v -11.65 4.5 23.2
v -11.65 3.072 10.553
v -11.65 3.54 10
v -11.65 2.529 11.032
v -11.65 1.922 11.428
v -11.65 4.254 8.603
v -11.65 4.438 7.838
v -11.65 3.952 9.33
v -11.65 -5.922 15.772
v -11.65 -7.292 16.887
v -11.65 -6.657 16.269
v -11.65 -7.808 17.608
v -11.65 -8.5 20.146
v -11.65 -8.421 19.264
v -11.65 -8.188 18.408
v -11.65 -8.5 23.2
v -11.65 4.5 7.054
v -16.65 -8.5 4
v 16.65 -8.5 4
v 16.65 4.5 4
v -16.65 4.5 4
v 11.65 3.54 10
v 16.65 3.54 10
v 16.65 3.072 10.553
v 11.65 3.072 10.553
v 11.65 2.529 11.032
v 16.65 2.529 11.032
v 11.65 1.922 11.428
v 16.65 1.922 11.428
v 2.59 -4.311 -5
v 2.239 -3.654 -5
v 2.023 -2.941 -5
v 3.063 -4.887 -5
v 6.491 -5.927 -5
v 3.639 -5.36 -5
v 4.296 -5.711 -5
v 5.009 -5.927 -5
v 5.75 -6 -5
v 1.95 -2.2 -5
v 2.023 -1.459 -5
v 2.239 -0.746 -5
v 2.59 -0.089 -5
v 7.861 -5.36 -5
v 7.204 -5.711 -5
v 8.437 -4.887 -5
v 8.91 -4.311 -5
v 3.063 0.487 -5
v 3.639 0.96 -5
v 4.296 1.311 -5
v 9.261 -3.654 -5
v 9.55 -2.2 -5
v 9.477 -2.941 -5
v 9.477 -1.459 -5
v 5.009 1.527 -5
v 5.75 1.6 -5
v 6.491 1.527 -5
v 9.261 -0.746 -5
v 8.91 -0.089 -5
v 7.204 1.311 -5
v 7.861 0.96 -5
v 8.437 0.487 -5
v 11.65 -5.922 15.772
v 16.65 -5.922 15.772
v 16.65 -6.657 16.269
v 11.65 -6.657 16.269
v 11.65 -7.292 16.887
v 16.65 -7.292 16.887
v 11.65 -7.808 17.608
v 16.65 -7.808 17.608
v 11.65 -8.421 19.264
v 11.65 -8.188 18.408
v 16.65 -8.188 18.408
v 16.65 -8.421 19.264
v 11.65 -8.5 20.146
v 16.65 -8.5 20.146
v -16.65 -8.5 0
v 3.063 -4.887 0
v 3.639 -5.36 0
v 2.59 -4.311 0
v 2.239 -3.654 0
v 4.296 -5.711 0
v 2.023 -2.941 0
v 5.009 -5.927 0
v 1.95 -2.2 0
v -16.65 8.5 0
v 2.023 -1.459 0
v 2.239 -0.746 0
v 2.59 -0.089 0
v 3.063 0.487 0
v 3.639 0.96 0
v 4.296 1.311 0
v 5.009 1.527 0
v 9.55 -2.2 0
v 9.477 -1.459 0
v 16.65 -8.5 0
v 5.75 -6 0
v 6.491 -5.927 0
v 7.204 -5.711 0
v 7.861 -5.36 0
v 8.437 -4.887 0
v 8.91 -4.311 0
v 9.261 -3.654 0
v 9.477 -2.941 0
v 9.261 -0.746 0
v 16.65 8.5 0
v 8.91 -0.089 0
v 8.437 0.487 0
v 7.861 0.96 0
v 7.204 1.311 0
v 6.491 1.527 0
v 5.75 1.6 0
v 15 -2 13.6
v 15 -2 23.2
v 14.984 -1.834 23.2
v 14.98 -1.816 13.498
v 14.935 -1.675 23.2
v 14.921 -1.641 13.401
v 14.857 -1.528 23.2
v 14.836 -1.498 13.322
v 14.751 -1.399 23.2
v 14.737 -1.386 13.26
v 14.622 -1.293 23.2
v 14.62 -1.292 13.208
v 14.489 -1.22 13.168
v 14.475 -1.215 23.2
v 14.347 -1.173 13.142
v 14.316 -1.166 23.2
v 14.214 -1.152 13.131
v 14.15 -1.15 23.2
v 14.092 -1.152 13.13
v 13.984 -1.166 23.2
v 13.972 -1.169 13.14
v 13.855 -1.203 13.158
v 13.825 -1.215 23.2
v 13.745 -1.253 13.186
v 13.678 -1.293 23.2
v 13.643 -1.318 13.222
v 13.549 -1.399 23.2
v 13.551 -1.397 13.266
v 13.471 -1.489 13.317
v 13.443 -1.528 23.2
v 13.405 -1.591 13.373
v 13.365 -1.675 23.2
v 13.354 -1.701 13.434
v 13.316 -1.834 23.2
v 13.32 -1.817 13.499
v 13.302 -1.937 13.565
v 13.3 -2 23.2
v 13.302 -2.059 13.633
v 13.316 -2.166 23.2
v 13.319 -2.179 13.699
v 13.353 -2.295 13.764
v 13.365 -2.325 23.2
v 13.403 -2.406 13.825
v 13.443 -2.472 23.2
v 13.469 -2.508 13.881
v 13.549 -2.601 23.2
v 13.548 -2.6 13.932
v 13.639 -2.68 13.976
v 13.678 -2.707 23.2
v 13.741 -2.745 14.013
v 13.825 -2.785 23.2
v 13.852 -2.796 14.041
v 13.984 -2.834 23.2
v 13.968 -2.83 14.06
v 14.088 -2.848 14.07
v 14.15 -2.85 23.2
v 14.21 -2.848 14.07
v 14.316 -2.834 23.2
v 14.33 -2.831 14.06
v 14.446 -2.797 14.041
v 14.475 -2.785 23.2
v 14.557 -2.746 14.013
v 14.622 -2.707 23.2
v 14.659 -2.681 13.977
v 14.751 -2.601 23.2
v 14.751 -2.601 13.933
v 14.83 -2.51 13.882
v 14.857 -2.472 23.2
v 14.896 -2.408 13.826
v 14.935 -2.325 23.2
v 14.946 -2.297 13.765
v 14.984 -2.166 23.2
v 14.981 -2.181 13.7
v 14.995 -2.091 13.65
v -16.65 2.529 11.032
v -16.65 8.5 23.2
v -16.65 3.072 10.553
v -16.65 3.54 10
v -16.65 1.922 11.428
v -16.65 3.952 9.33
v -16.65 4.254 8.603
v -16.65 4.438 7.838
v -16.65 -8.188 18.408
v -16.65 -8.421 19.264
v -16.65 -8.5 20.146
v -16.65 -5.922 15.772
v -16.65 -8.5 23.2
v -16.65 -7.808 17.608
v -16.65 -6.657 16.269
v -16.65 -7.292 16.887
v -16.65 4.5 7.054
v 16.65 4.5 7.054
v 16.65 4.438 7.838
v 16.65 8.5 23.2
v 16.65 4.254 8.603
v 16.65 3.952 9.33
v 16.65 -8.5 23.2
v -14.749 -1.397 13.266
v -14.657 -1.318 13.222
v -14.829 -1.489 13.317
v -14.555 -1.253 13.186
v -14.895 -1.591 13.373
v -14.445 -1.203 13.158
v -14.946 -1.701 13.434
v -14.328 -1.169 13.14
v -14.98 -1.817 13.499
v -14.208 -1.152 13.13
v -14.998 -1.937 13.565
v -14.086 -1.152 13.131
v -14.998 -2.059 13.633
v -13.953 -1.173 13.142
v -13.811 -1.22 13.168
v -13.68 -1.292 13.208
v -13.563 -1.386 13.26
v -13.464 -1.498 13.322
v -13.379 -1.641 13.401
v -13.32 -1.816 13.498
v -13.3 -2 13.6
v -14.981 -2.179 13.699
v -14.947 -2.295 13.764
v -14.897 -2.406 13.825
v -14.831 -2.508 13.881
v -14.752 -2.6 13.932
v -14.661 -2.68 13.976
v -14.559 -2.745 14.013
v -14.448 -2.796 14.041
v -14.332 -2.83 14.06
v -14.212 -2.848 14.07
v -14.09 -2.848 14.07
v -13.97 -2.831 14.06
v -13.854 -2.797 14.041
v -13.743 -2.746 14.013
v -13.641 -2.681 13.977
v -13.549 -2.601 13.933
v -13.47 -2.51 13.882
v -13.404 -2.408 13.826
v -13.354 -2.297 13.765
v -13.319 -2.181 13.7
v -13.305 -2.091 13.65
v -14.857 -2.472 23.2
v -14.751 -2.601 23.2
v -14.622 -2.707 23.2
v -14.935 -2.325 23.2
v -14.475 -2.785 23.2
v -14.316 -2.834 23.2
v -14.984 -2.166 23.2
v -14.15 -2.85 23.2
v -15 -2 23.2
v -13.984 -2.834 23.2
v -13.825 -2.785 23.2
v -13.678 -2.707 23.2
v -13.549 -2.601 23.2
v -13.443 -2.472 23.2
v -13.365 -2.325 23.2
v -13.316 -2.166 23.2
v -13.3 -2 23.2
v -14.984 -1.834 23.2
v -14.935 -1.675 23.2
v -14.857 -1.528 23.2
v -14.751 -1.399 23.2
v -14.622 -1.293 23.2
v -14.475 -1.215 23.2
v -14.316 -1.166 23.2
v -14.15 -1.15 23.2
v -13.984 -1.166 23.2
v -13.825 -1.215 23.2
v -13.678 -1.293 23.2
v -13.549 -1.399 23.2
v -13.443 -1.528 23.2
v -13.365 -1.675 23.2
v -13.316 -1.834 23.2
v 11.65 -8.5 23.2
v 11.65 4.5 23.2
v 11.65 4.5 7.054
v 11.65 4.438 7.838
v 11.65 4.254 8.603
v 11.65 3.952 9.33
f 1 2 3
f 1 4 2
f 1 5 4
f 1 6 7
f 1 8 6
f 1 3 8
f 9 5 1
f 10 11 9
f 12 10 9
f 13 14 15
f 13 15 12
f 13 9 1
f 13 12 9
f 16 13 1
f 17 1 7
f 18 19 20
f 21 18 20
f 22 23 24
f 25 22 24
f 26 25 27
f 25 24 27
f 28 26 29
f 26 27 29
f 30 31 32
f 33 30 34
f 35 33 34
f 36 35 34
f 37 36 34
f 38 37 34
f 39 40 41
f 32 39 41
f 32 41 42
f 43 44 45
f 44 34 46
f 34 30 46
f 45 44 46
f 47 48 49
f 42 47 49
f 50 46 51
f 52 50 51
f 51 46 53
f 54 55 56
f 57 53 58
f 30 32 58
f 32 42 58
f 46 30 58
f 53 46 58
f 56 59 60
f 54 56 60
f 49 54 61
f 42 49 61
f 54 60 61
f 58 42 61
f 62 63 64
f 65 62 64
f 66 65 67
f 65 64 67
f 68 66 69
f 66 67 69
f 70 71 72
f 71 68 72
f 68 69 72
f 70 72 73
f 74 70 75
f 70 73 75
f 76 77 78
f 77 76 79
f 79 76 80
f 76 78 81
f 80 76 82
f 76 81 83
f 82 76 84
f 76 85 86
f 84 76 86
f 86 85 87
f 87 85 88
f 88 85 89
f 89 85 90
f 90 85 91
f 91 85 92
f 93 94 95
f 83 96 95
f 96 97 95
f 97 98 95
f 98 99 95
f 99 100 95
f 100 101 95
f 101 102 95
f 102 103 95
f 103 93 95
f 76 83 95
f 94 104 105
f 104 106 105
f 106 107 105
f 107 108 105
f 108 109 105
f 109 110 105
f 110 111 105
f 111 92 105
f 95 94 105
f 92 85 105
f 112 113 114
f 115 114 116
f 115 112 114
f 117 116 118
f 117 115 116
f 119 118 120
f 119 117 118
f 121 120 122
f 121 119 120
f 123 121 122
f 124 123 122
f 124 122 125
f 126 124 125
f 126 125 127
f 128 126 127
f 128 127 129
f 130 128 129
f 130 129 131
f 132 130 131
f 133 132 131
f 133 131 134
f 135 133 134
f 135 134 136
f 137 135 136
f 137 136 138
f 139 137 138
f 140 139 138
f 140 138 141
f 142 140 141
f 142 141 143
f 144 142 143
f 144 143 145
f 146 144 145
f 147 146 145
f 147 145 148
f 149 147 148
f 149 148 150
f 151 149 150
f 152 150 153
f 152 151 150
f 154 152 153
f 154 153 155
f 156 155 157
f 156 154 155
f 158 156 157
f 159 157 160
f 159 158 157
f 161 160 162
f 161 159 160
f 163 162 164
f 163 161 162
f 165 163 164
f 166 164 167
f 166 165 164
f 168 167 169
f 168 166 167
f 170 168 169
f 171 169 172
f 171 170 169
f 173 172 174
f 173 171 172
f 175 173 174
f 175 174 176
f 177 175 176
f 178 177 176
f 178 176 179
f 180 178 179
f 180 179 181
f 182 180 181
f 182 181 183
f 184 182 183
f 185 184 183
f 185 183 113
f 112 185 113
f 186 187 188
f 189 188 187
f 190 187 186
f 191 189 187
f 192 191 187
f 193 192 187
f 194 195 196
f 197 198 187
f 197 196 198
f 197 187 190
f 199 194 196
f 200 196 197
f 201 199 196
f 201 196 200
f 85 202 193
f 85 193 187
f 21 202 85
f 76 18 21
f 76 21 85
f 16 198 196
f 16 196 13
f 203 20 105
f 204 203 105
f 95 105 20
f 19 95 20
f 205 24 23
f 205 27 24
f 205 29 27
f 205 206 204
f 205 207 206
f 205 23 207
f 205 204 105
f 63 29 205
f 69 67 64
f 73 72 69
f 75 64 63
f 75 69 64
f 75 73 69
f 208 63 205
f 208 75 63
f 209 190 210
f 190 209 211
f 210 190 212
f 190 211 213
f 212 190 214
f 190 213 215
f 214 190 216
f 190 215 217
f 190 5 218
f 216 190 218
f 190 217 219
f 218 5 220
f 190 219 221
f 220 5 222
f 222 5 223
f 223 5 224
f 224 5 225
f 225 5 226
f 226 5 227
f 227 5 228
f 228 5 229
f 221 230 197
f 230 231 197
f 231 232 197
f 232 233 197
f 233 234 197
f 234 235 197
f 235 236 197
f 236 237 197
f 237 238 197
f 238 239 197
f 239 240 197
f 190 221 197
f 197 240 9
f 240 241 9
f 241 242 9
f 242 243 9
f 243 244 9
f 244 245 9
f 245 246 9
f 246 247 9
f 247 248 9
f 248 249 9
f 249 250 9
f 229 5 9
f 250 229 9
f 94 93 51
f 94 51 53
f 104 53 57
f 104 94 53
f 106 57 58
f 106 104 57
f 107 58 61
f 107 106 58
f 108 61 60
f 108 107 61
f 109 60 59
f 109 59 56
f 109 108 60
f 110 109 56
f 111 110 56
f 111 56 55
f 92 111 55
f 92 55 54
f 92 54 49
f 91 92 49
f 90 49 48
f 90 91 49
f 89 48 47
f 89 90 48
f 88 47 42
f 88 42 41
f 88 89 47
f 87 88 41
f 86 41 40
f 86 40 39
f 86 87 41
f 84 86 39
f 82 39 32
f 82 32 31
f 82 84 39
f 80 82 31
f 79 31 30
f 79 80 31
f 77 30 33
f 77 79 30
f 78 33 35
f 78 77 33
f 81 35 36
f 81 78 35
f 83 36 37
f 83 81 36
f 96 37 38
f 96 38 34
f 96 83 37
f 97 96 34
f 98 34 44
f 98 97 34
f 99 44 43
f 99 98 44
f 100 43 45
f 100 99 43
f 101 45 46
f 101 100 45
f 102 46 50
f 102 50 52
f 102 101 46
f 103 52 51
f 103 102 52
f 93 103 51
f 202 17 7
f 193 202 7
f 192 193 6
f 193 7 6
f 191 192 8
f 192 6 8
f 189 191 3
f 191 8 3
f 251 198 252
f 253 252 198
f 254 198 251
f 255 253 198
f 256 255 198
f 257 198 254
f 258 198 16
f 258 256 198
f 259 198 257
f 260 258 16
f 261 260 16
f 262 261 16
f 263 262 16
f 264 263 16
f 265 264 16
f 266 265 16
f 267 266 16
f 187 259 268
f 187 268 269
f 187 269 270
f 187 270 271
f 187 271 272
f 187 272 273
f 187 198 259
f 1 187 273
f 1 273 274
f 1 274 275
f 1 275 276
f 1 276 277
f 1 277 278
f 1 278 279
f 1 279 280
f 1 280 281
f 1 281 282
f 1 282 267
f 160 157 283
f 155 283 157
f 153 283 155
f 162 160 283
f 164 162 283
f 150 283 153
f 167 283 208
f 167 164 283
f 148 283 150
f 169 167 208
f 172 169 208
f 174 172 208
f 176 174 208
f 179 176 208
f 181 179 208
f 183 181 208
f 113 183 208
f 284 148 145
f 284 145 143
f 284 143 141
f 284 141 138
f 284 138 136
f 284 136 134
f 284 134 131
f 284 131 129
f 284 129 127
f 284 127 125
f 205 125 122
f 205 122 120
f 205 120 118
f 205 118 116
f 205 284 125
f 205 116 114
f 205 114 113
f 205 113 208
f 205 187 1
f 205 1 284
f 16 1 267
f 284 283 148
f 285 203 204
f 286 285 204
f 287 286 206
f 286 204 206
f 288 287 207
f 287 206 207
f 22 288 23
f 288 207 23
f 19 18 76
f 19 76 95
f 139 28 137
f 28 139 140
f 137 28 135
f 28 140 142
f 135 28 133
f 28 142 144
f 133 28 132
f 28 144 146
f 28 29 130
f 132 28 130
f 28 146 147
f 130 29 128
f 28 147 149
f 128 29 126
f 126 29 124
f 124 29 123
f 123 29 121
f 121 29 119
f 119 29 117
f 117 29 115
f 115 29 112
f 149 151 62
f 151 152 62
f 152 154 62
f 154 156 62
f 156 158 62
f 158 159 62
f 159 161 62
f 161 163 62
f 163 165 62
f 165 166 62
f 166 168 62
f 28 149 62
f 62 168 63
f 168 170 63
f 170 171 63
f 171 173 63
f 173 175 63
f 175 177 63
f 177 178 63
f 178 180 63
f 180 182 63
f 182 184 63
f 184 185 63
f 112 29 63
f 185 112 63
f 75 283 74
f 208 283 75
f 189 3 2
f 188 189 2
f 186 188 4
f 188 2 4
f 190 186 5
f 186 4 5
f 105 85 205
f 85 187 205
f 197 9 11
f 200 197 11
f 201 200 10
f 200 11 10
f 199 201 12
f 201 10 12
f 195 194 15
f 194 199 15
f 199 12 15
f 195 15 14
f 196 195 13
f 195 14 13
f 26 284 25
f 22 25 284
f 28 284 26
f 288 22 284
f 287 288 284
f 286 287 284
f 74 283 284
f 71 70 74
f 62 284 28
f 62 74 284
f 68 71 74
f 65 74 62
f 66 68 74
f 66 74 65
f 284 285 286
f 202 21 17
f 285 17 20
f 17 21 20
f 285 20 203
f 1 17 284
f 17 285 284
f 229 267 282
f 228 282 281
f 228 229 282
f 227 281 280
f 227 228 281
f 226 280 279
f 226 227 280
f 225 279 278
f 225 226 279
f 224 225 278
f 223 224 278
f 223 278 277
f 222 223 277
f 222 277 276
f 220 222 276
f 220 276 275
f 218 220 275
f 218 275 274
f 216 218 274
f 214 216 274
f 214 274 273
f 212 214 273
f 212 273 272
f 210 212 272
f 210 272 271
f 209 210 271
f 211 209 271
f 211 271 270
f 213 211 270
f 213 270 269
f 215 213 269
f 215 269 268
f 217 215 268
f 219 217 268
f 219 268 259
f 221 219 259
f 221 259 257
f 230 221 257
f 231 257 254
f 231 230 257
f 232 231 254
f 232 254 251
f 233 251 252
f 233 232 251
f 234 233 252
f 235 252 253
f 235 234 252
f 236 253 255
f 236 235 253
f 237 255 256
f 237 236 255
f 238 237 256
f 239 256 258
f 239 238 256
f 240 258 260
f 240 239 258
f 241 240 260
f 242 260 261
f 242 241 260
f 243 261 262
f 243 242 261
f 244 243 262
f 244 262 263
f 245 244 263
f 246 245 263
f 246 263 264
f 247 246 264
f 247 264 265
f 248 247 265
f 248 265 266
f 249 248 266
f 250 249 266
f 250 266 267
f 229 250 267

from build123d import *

# Parameters (mm, degrees)
F1_W     = 5
F1_H     = 7.2
F1_H_2   = 6
F1_H_3   = 4
F1_W_2   = 23.3
F3_DEPTH = 8.5
F4_DEPTH = 23.2
F5_DEPTH = 18.1
F6_START = 4.3
F0_R     = 0.85
F6_DEPTH = 20.7
F0_R_2   = 3.8
F7_DEPTH = 5


with BuildPart() as f3:
    # F1 (on Front) → F3 (new body, symmetric)
    with BuildSketch(Plane.XZ):
        with Locations((-14.15, 13.6)):
            Rectangle(F1_W, F1_H)
        with Locations((-14.15, 20.2)):
            Rectangle(F1_W, F1_H_2)
        with Locations((-14.15, 7)):
            Rectangle(F1_W, F1_H_2)
        with Locations((-14.15, 2)):
            Rectangle(F1_W, F1_H_3)
        with Locations((0, 2)):
            Rectangle(F1_W_2, F1_H_3)
        with Locations((14.15, 2)):
            Rectangle(F1_W, F1_H_3)
        with Locations((14.15, 7)):
            Rectangle(F1_W, F1_H_2)
        with Locations((14.15, 13.6)):
            Rectangle(F1_W, F1_H)
        with Locations((14.15, 20.2)):
            Rectangle(F1_W, F1_H_2)
    extrude(amount=F3_DEPTH, both=True)

    # F0 (on Top) → F4 (join)
    with BuildSketch(Plane.XY):
        Polygon((11.65, 4.5), (11.65, 8.5), (0, 8.5), (-11.65, 8.5), (-11.65, 4.5), align=None)
    extrude(amount=F4_DEPTH)

    # F2 (on Right) → F5 (cut, symmetric)
    with BuildSketch(Plane.YZ):
        with BuildLine():
            Line((-8.5, 17.2), (-8.5, 10))
            Line((-8.5, 10), (3.5396314061, 10))
            ThreePointArc((3.5396314061, 10), (2.8089650426, 10.8020152096), (1.9224991399, 11.4275389379))
            Line((1.9224991399, 11.4275389379), (-5.9224991399, 15.7724610621))
            ThreePointArc((-5.9224991399, 15.7724610621), (-6.8089650426, 16.3979847904), (-7.5396314061, 17.2))
            Line((-7.5396314061, 17.2), (-8.5, 17.2))
        make_face()
        with BuildLine():
            Line((-8.5, 20.1464178425), (-8.5, 17.2))
            Line((-8.5, 17.2), (-7.5396314061, 17.2))
            ThreePointArc((-7.5396314061, 17.2), (-8.2538488107, 18.5969271247), (-8.5, 20.1464178425))
        make_face()
        with BuildLine():
            Line((-8.5, 10), (-8.5, 4))
            Line((-8.5, 4), (4.5, 4))
            Line((4.5, 4), (4.5, 7.0535821575))
            ThreePointArc((4.5, 7.0535821575), (4.2538488107, 8.6030728753), (3.5396314061, 10))
            Line((3.5396314061, 10), (-8.5, 10))
        make_face()
    extrude(amount=F5_DEPTH, both=True, mode=Mode.SUBTRACT)

    # F0 (on Top) → F6 (cut)
    with BuildSketch(Plane.XY.offset(F6_START)):
        with Locations((14.15, -2)):
            Circle(F0_R)
        with Locations((-14.15, -2)):
            Circle(F0_R)
    extrude(amount=F6_DEPTH, mode=Mode.SUBTRACT)

    # F0 (on Top) → F7 (join)
    with BuildSketch(Plane.XY):
        with Locations((5.75, -2.2)):
            Circle(F0_R_2)
    extrude(amount=-F7_DEPTH)


solid = f3.part
